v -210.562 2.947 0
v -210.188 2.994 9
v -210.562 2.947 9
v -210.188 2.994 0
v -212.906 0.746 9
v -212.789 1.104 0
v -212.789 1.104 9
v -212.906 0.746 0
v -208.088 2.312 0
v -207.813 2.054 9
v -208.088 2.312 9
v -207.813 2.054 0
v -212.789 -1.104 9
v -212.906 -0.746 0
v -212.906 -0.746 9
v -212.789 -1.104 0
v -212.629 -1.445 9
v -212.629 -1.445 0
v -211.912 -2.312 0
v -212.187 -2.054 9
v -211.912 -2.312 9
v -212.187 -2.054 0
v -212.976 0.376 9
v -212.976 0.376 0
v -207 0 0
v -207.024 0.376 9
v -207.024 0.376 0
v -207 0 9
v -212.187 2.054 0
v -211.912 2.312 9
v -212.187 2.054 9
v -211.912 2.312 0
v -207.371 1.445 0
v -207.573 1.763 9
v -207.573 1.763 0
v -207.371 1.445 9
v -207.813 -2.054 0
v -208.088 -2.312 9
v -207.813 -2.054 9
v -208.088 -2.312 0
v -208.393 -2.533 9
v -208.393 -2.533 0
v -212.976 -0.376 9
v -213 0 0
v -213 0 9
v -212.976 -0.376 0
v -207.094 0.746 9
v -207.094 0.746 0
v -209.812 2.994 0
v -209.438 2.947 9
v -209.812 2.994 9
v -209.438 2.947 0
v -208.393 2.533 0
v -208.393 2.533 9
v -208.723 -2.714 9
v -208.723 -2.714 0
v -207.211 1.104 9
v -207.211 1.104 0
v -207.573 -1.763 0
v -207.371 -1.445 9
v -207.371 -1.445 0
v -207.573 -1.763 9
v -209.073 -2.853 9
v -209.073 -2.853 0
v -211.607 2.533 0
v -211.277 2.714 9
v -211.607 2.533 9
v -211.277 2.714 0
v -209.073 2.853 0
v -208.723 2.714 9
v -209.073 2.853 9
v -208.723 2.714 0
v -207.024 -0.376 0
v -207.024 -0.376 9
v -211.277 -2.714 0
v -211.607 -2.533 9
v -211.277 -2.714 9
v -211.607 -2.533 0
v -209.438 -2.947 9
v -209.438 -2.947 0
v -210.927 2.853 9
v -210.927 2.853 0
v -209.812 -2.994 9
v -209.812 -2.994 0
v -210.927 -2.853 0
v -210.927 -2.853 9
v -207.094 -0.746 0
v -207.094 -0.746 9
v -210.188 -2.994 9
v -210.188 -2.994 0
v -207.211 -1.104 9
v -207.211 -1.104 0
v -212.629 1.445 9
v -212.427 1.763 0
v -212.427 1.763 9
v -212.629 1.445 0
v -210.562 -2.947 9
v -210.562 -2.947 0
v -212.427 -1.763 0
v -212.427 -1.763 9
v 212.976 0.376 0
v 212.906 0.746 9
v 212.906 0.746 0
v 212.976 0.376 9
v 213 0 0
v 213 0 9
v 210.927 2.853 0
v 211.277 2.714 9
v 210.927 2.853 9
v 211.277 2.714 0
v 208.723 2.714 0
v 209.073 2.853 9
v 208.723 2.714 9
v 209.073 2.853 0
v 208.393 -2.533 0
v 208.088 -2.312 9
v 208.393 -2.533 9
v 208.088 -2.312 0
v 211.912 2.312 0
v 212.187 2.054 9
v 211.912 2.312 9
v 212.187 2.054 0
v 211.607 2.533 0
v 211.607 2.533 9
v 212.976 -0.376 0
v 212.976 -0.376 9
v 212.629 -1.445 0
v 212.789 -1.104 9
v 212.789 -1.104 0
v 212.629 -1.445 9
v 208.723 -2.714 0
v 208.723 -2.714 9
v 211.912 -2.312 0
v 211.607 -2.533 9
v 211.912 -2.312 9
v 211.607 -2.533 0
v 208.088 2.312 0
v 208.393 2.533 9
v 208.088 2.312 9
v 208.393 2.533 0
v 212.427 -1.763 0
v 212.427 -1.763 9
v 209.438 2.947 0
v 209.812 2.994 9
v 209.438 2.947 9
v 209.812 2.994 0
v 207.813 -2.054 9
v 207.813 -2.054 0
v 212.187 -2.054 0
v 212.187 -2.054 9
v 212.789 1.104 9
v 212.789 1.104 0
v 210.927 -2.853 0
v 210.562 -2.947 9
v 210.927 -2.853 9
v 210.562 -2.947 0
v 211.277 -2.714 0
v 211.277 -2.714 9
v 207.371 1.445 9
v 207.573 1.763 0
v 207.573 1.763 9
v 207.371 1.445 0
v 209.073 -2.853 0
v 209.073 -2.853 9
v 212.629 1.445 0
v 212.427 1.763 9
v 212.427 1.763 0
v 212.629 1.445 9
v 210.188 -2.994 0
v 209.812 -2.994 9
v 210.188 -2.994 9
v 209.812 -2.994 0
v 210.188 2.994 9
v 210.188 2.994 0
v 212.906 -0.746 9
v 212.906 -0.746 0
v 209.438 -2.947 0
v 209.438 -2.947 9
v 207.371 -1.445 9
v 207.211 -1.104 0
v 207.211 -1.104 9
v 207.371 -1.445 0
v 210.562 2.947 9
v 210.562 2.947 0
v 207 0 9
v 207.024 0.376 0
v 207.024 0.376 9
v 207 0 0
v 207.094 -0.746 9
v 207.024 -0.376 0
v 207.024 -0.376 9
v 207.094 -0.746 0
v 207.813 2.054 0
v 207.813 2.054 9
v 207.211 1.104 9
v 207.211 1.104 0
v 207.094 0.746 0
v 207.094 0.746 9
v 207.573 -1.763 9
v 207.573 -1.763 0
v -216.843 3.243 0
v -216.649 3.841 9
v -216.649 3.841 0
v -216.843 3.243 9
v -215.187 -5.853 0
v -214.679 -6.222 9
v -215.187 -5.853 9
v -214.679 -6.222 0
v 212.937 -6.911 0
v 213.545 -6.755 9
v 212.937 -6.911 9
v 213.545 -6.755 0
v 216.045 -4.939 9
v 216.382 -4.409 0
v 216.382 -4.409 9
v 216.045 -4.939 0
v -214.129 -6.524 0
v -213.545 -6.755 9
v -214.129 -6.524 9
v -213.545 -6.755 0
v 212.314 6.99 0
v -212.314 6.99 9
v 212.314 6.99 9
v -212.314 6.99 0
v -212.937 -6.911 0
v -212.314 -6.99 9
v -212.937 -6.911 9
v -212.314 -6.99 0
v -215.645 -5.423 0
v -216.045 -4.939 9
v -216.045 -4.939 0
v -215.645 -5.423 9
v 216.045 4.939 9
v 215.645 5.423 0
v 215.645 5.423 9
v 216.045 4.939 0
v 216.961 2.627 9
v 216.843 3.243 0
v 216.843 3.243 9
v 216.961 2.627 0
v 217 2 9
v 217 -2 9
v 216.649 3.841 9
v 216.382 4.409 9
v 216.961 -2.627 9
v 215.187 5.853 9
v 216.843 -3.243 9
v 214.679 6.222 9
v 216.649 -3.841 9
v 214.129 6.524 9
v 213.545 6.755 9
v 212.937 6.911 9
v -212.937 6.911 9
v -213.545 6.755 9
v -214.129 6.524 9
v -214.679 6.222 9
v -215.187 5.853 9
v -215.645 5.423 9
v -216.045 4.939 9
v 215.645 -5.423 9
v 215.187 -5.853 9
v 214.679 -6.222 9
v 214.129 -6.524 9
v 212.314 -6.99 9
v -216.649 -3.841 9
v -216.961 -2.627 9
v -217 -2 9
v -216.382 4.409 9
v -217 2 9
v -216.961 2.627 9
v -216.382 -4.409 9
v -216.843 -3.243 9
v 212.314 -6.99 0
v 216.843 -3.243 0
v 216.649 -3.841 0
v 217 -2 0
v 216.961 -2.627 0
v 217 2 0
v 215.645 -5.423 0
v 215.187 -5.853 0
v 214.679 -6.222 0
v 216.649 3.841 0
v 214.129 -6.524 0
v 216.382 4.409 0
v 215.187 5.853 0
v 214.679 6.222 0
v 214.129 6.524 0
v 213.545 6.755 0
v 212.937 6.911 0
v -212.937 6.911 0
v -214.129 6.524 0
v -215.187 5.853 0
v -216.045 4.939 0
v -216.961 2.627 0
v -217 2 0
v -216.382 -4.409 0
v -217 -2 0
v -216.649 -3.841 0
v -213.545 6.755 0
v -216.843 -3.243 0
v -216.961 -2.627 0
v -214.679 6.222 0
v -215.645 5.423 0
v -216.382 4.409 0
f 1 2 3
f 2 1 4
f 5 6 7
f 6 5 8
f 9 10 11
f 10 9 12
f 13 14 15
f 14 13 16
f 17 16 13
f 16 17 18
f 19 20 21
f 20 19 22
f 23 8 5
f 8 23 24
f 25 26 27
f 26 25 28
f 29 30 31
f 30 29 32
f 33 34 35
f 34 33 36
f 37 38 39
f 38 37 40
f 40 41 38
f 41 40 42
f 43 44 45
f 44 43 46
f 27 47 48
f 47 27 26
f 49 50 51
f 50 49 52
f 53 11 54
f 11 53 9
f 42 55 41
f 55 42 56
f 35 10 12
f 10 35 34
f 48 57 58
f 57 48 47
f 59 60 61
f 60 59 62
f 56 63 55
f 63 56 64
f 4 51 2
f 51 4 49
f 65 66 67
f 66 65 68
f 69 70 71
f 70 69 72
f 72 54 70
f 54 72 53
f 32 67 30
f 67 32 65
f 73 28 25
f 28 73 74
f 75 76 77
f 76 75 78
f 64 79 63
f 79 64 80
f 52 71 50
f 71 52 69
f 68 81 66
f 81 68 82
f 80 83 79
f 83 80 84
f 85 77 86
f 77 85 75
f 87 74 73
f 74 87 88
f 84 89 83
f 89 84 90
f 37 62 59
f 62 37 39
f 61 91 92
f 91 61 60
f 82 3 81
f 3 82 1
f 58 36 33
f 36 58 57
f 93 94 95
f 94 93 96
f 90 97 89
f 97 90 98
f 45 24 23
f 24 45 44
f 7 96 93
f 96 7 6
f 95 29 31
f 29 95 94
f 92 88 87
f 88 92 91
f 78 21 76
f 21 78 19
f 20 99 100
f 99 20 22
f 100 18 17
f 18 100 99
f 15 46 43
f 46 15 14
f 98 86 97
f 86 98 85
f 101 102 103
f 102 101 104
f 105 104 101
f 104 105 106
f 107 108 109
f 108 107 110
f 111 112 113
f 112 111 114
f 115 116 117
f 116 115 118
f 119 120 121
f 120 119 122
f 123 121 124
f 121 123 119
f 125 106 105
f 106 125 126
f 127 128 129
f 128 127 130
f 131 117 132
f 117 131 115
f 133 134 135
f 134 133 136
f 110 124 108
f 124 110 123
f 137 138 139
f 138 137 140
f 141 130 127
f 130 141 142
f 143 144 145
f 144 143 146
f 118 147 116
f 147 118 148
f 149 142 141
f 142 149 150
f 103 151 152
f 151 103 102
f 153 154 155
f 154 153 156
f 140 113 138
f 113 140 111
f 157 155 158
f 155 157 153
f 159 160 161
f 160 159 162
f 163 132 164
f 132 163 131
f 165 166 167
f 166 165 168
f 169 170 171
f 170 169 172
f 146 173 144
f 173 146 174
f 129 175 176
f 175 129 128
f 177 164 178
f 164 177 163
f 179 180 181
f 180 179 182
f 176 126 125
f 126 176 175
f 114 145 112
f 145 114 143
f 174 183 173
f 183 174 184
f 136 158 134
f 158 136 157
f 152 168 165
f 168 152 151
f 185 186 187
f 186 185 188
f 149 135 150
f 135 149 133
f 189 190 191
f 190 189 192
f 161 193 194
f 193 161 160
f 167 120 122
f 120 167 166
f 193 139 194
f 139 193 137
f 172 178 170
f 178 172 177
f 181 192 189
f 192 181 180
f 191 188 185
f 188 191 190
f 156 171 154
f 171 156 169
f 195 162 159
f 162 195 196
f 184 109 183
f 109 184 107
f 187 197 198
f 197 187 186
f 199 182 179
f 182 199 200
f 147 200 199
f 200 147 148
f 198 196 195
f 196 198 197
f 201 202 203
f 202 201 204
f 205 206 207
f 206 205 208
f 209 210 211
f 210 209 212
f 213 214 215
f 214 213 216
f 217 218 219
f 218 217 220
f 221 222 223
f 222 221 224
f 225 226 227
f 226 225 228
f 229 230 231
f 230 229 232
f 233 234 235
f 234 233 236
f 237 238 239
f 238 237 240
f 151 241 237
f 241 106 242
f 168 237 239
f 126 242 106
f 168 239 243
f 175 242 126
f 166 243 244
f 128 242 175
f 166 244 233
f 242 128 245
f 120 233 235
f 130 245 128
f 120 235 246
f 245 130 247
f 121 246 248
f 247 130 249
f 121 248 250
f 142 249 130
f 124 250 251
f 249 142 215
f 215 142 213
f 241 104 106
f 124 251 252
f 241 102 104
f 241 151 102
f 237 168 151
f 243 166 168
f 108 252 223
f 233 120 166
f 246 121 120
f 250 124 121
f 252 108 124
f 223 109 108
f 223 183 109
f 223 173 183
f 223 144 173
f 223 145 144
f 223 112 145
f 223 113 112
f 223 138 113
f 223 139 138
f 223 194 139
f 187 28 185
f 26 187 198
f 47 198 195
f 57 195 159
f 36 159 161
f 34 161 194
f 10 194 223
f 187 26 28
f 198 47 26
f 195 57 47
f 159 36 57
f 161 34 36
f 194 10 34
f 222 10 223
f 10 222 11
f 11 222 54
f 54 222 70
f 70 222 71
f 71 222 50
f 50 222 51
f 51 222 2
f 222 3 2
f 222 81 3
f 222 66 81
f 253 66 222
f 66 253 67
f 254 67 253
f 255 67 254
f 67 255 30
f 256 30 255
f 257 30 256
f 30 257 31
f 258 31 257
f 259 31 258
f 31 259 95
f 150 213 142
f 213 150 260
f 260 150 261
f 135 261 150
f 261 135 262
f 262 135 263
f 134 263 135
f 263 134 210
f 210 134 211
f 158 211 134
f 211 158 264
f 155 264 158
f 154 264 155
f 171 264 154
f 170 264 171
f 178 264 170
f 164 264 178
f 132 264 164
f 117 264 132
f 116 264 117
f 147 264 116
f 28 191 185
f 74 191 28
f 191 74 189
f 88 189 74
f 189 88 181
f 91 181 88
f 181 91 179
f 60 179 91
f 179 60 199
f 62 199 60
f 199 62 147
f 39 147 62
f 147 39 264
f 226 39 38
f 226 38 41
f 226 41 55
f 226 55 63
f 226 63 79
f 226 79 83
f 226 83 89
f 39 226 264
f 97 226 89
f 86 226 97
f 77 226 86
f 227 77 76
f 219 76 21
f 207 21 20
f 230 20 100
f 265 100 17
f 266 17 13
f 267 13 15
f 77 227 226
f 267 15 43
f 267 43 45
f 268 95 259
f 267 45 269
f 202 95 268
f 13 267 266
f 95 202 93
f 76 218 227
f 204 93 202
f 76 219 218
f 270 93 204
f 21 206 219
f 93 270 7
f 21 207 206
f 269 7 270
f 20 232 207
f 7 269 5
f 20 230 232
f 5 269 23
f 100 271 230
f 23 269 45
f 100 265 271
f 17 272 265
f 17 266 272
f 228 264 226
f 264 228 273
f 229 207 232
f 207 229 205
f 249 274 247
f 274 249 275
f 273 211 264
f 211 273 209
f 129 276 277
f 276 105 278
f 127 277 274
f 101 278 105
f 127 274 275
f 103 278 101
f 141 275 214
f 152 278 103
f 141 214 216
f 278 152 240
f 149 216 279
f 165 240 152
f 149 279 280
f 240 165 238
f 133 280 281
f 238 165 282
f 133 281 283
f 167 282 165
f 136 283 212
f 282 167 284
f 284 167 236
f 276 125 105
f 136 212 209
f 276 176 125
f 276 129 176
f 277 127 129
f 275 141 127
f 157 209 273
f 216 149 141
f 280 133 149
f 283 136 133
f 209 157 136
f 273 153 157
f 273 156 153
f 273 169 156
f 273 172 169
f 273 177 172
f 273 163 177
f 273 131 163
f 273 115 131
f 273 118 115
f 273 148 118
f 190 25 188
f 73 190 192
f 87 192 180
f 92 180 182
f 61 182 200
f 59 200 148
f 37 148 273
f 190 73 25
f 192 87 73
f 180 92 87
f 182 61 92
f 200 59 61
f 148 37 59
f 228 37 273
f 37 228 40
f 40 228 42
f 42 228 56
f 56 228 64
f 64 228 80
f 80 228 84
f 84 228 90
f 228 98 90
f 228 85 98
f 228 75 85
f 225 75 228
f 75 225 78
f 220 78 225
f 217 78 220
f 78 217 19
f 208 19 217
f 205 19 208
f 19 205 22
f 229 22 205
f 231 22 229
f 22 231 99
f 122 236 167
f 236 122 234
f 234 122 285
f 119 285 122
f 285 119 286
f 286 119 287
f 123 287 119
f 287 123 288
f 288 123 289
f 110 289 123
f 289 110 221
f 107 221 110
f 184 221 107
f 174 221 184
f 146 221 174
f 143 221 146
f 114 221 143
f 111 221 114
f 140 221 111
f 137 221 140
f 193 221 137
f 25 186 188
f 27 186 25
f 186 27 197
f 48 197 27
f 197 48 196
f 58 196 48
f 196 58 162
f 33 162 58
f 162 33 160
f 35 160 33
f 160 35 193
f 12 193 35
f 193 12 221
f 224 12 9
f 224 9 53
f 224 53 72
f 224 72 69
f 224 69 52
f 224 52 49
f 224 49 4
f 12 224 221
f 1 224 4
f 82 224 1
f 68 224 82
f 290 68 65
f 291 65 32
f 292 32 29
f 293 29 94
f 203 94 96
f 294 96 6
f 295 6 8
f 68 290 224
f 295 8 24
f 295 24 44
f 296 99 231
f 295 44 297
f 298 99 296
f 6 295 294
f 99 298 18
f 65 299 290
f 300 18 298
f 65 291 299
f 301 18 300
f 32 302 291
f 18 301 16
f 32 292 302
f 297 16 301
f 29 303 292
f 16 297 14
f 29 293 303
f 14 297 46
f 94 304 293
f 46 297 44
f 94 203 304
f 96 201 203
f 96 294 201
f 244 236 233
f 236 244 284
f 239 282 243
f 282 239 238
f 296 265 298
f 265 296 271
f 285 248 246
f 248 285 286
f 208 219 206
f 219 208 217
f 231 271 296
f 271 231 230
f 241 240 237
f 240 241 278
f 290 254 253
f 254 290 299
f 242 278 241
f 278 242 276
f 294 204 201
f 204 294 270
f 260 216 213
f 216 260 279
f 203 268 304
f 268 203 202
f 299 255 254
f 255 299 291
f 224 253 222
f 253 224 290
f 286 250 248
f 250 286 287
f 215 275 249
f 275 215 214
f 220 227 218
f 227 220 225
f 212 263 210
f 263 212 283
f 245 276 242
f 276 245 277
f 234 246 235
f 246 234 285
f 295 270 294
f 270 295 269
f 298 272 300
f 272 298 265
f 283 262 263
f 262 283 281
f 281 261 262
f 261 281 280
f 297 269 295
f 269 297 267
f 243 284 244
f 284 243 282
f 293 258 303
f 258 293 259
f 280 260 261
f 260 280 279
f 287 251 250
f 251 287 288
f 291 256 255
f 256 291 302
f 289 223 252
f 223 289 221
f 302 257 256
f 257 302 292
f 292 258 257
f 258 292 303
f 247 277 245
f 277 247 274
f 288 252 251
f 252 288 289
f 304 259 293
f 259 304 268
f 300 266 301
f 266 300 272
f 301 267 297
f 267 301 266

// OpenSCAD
$fn = 50;


difference() {
	union() {
		hull() {
			translate(v = [-212.0000000000, 2.0000000000, 0]) {
				cylinder(h = 9, r = 5);
			}
			translate(v = [212.0000000000, 2.0000000000, 0]) {
				cylinder(h = 9, r = 5);
			}
			translate(v = [-212.0000000000, -2.0000000000, 0]) {
				cylinder(h = 9, r = 5);
			}
			translate(v = [212.0000000000, -2.0000000000, 0]) {
				cylinder(h = 9, r = 5);
			}
		}
	}
	union() {
		translate(v = [-210.0000000000, 0.0000000000, -100.0000000000]) {
			cylinder(h = 200, r = 3.0000000000);
		}
		translate(v = [-210.0000000000, 0.0000000000, -100.0000000000]) {
			cylinder(h = 200, r = 3.0000000000);
		}
		translate(v = [210.0000000000, 0.0000000000, -100.0000000000]) {
			cylinder(h = 200, r = 3.0000000000);
		}
		translate(v = [210.0000000000, 0.0000000000, -100.0000000000]) {
			cylinder(h = 200, r = 3.0000000000);
		}
	}
}
